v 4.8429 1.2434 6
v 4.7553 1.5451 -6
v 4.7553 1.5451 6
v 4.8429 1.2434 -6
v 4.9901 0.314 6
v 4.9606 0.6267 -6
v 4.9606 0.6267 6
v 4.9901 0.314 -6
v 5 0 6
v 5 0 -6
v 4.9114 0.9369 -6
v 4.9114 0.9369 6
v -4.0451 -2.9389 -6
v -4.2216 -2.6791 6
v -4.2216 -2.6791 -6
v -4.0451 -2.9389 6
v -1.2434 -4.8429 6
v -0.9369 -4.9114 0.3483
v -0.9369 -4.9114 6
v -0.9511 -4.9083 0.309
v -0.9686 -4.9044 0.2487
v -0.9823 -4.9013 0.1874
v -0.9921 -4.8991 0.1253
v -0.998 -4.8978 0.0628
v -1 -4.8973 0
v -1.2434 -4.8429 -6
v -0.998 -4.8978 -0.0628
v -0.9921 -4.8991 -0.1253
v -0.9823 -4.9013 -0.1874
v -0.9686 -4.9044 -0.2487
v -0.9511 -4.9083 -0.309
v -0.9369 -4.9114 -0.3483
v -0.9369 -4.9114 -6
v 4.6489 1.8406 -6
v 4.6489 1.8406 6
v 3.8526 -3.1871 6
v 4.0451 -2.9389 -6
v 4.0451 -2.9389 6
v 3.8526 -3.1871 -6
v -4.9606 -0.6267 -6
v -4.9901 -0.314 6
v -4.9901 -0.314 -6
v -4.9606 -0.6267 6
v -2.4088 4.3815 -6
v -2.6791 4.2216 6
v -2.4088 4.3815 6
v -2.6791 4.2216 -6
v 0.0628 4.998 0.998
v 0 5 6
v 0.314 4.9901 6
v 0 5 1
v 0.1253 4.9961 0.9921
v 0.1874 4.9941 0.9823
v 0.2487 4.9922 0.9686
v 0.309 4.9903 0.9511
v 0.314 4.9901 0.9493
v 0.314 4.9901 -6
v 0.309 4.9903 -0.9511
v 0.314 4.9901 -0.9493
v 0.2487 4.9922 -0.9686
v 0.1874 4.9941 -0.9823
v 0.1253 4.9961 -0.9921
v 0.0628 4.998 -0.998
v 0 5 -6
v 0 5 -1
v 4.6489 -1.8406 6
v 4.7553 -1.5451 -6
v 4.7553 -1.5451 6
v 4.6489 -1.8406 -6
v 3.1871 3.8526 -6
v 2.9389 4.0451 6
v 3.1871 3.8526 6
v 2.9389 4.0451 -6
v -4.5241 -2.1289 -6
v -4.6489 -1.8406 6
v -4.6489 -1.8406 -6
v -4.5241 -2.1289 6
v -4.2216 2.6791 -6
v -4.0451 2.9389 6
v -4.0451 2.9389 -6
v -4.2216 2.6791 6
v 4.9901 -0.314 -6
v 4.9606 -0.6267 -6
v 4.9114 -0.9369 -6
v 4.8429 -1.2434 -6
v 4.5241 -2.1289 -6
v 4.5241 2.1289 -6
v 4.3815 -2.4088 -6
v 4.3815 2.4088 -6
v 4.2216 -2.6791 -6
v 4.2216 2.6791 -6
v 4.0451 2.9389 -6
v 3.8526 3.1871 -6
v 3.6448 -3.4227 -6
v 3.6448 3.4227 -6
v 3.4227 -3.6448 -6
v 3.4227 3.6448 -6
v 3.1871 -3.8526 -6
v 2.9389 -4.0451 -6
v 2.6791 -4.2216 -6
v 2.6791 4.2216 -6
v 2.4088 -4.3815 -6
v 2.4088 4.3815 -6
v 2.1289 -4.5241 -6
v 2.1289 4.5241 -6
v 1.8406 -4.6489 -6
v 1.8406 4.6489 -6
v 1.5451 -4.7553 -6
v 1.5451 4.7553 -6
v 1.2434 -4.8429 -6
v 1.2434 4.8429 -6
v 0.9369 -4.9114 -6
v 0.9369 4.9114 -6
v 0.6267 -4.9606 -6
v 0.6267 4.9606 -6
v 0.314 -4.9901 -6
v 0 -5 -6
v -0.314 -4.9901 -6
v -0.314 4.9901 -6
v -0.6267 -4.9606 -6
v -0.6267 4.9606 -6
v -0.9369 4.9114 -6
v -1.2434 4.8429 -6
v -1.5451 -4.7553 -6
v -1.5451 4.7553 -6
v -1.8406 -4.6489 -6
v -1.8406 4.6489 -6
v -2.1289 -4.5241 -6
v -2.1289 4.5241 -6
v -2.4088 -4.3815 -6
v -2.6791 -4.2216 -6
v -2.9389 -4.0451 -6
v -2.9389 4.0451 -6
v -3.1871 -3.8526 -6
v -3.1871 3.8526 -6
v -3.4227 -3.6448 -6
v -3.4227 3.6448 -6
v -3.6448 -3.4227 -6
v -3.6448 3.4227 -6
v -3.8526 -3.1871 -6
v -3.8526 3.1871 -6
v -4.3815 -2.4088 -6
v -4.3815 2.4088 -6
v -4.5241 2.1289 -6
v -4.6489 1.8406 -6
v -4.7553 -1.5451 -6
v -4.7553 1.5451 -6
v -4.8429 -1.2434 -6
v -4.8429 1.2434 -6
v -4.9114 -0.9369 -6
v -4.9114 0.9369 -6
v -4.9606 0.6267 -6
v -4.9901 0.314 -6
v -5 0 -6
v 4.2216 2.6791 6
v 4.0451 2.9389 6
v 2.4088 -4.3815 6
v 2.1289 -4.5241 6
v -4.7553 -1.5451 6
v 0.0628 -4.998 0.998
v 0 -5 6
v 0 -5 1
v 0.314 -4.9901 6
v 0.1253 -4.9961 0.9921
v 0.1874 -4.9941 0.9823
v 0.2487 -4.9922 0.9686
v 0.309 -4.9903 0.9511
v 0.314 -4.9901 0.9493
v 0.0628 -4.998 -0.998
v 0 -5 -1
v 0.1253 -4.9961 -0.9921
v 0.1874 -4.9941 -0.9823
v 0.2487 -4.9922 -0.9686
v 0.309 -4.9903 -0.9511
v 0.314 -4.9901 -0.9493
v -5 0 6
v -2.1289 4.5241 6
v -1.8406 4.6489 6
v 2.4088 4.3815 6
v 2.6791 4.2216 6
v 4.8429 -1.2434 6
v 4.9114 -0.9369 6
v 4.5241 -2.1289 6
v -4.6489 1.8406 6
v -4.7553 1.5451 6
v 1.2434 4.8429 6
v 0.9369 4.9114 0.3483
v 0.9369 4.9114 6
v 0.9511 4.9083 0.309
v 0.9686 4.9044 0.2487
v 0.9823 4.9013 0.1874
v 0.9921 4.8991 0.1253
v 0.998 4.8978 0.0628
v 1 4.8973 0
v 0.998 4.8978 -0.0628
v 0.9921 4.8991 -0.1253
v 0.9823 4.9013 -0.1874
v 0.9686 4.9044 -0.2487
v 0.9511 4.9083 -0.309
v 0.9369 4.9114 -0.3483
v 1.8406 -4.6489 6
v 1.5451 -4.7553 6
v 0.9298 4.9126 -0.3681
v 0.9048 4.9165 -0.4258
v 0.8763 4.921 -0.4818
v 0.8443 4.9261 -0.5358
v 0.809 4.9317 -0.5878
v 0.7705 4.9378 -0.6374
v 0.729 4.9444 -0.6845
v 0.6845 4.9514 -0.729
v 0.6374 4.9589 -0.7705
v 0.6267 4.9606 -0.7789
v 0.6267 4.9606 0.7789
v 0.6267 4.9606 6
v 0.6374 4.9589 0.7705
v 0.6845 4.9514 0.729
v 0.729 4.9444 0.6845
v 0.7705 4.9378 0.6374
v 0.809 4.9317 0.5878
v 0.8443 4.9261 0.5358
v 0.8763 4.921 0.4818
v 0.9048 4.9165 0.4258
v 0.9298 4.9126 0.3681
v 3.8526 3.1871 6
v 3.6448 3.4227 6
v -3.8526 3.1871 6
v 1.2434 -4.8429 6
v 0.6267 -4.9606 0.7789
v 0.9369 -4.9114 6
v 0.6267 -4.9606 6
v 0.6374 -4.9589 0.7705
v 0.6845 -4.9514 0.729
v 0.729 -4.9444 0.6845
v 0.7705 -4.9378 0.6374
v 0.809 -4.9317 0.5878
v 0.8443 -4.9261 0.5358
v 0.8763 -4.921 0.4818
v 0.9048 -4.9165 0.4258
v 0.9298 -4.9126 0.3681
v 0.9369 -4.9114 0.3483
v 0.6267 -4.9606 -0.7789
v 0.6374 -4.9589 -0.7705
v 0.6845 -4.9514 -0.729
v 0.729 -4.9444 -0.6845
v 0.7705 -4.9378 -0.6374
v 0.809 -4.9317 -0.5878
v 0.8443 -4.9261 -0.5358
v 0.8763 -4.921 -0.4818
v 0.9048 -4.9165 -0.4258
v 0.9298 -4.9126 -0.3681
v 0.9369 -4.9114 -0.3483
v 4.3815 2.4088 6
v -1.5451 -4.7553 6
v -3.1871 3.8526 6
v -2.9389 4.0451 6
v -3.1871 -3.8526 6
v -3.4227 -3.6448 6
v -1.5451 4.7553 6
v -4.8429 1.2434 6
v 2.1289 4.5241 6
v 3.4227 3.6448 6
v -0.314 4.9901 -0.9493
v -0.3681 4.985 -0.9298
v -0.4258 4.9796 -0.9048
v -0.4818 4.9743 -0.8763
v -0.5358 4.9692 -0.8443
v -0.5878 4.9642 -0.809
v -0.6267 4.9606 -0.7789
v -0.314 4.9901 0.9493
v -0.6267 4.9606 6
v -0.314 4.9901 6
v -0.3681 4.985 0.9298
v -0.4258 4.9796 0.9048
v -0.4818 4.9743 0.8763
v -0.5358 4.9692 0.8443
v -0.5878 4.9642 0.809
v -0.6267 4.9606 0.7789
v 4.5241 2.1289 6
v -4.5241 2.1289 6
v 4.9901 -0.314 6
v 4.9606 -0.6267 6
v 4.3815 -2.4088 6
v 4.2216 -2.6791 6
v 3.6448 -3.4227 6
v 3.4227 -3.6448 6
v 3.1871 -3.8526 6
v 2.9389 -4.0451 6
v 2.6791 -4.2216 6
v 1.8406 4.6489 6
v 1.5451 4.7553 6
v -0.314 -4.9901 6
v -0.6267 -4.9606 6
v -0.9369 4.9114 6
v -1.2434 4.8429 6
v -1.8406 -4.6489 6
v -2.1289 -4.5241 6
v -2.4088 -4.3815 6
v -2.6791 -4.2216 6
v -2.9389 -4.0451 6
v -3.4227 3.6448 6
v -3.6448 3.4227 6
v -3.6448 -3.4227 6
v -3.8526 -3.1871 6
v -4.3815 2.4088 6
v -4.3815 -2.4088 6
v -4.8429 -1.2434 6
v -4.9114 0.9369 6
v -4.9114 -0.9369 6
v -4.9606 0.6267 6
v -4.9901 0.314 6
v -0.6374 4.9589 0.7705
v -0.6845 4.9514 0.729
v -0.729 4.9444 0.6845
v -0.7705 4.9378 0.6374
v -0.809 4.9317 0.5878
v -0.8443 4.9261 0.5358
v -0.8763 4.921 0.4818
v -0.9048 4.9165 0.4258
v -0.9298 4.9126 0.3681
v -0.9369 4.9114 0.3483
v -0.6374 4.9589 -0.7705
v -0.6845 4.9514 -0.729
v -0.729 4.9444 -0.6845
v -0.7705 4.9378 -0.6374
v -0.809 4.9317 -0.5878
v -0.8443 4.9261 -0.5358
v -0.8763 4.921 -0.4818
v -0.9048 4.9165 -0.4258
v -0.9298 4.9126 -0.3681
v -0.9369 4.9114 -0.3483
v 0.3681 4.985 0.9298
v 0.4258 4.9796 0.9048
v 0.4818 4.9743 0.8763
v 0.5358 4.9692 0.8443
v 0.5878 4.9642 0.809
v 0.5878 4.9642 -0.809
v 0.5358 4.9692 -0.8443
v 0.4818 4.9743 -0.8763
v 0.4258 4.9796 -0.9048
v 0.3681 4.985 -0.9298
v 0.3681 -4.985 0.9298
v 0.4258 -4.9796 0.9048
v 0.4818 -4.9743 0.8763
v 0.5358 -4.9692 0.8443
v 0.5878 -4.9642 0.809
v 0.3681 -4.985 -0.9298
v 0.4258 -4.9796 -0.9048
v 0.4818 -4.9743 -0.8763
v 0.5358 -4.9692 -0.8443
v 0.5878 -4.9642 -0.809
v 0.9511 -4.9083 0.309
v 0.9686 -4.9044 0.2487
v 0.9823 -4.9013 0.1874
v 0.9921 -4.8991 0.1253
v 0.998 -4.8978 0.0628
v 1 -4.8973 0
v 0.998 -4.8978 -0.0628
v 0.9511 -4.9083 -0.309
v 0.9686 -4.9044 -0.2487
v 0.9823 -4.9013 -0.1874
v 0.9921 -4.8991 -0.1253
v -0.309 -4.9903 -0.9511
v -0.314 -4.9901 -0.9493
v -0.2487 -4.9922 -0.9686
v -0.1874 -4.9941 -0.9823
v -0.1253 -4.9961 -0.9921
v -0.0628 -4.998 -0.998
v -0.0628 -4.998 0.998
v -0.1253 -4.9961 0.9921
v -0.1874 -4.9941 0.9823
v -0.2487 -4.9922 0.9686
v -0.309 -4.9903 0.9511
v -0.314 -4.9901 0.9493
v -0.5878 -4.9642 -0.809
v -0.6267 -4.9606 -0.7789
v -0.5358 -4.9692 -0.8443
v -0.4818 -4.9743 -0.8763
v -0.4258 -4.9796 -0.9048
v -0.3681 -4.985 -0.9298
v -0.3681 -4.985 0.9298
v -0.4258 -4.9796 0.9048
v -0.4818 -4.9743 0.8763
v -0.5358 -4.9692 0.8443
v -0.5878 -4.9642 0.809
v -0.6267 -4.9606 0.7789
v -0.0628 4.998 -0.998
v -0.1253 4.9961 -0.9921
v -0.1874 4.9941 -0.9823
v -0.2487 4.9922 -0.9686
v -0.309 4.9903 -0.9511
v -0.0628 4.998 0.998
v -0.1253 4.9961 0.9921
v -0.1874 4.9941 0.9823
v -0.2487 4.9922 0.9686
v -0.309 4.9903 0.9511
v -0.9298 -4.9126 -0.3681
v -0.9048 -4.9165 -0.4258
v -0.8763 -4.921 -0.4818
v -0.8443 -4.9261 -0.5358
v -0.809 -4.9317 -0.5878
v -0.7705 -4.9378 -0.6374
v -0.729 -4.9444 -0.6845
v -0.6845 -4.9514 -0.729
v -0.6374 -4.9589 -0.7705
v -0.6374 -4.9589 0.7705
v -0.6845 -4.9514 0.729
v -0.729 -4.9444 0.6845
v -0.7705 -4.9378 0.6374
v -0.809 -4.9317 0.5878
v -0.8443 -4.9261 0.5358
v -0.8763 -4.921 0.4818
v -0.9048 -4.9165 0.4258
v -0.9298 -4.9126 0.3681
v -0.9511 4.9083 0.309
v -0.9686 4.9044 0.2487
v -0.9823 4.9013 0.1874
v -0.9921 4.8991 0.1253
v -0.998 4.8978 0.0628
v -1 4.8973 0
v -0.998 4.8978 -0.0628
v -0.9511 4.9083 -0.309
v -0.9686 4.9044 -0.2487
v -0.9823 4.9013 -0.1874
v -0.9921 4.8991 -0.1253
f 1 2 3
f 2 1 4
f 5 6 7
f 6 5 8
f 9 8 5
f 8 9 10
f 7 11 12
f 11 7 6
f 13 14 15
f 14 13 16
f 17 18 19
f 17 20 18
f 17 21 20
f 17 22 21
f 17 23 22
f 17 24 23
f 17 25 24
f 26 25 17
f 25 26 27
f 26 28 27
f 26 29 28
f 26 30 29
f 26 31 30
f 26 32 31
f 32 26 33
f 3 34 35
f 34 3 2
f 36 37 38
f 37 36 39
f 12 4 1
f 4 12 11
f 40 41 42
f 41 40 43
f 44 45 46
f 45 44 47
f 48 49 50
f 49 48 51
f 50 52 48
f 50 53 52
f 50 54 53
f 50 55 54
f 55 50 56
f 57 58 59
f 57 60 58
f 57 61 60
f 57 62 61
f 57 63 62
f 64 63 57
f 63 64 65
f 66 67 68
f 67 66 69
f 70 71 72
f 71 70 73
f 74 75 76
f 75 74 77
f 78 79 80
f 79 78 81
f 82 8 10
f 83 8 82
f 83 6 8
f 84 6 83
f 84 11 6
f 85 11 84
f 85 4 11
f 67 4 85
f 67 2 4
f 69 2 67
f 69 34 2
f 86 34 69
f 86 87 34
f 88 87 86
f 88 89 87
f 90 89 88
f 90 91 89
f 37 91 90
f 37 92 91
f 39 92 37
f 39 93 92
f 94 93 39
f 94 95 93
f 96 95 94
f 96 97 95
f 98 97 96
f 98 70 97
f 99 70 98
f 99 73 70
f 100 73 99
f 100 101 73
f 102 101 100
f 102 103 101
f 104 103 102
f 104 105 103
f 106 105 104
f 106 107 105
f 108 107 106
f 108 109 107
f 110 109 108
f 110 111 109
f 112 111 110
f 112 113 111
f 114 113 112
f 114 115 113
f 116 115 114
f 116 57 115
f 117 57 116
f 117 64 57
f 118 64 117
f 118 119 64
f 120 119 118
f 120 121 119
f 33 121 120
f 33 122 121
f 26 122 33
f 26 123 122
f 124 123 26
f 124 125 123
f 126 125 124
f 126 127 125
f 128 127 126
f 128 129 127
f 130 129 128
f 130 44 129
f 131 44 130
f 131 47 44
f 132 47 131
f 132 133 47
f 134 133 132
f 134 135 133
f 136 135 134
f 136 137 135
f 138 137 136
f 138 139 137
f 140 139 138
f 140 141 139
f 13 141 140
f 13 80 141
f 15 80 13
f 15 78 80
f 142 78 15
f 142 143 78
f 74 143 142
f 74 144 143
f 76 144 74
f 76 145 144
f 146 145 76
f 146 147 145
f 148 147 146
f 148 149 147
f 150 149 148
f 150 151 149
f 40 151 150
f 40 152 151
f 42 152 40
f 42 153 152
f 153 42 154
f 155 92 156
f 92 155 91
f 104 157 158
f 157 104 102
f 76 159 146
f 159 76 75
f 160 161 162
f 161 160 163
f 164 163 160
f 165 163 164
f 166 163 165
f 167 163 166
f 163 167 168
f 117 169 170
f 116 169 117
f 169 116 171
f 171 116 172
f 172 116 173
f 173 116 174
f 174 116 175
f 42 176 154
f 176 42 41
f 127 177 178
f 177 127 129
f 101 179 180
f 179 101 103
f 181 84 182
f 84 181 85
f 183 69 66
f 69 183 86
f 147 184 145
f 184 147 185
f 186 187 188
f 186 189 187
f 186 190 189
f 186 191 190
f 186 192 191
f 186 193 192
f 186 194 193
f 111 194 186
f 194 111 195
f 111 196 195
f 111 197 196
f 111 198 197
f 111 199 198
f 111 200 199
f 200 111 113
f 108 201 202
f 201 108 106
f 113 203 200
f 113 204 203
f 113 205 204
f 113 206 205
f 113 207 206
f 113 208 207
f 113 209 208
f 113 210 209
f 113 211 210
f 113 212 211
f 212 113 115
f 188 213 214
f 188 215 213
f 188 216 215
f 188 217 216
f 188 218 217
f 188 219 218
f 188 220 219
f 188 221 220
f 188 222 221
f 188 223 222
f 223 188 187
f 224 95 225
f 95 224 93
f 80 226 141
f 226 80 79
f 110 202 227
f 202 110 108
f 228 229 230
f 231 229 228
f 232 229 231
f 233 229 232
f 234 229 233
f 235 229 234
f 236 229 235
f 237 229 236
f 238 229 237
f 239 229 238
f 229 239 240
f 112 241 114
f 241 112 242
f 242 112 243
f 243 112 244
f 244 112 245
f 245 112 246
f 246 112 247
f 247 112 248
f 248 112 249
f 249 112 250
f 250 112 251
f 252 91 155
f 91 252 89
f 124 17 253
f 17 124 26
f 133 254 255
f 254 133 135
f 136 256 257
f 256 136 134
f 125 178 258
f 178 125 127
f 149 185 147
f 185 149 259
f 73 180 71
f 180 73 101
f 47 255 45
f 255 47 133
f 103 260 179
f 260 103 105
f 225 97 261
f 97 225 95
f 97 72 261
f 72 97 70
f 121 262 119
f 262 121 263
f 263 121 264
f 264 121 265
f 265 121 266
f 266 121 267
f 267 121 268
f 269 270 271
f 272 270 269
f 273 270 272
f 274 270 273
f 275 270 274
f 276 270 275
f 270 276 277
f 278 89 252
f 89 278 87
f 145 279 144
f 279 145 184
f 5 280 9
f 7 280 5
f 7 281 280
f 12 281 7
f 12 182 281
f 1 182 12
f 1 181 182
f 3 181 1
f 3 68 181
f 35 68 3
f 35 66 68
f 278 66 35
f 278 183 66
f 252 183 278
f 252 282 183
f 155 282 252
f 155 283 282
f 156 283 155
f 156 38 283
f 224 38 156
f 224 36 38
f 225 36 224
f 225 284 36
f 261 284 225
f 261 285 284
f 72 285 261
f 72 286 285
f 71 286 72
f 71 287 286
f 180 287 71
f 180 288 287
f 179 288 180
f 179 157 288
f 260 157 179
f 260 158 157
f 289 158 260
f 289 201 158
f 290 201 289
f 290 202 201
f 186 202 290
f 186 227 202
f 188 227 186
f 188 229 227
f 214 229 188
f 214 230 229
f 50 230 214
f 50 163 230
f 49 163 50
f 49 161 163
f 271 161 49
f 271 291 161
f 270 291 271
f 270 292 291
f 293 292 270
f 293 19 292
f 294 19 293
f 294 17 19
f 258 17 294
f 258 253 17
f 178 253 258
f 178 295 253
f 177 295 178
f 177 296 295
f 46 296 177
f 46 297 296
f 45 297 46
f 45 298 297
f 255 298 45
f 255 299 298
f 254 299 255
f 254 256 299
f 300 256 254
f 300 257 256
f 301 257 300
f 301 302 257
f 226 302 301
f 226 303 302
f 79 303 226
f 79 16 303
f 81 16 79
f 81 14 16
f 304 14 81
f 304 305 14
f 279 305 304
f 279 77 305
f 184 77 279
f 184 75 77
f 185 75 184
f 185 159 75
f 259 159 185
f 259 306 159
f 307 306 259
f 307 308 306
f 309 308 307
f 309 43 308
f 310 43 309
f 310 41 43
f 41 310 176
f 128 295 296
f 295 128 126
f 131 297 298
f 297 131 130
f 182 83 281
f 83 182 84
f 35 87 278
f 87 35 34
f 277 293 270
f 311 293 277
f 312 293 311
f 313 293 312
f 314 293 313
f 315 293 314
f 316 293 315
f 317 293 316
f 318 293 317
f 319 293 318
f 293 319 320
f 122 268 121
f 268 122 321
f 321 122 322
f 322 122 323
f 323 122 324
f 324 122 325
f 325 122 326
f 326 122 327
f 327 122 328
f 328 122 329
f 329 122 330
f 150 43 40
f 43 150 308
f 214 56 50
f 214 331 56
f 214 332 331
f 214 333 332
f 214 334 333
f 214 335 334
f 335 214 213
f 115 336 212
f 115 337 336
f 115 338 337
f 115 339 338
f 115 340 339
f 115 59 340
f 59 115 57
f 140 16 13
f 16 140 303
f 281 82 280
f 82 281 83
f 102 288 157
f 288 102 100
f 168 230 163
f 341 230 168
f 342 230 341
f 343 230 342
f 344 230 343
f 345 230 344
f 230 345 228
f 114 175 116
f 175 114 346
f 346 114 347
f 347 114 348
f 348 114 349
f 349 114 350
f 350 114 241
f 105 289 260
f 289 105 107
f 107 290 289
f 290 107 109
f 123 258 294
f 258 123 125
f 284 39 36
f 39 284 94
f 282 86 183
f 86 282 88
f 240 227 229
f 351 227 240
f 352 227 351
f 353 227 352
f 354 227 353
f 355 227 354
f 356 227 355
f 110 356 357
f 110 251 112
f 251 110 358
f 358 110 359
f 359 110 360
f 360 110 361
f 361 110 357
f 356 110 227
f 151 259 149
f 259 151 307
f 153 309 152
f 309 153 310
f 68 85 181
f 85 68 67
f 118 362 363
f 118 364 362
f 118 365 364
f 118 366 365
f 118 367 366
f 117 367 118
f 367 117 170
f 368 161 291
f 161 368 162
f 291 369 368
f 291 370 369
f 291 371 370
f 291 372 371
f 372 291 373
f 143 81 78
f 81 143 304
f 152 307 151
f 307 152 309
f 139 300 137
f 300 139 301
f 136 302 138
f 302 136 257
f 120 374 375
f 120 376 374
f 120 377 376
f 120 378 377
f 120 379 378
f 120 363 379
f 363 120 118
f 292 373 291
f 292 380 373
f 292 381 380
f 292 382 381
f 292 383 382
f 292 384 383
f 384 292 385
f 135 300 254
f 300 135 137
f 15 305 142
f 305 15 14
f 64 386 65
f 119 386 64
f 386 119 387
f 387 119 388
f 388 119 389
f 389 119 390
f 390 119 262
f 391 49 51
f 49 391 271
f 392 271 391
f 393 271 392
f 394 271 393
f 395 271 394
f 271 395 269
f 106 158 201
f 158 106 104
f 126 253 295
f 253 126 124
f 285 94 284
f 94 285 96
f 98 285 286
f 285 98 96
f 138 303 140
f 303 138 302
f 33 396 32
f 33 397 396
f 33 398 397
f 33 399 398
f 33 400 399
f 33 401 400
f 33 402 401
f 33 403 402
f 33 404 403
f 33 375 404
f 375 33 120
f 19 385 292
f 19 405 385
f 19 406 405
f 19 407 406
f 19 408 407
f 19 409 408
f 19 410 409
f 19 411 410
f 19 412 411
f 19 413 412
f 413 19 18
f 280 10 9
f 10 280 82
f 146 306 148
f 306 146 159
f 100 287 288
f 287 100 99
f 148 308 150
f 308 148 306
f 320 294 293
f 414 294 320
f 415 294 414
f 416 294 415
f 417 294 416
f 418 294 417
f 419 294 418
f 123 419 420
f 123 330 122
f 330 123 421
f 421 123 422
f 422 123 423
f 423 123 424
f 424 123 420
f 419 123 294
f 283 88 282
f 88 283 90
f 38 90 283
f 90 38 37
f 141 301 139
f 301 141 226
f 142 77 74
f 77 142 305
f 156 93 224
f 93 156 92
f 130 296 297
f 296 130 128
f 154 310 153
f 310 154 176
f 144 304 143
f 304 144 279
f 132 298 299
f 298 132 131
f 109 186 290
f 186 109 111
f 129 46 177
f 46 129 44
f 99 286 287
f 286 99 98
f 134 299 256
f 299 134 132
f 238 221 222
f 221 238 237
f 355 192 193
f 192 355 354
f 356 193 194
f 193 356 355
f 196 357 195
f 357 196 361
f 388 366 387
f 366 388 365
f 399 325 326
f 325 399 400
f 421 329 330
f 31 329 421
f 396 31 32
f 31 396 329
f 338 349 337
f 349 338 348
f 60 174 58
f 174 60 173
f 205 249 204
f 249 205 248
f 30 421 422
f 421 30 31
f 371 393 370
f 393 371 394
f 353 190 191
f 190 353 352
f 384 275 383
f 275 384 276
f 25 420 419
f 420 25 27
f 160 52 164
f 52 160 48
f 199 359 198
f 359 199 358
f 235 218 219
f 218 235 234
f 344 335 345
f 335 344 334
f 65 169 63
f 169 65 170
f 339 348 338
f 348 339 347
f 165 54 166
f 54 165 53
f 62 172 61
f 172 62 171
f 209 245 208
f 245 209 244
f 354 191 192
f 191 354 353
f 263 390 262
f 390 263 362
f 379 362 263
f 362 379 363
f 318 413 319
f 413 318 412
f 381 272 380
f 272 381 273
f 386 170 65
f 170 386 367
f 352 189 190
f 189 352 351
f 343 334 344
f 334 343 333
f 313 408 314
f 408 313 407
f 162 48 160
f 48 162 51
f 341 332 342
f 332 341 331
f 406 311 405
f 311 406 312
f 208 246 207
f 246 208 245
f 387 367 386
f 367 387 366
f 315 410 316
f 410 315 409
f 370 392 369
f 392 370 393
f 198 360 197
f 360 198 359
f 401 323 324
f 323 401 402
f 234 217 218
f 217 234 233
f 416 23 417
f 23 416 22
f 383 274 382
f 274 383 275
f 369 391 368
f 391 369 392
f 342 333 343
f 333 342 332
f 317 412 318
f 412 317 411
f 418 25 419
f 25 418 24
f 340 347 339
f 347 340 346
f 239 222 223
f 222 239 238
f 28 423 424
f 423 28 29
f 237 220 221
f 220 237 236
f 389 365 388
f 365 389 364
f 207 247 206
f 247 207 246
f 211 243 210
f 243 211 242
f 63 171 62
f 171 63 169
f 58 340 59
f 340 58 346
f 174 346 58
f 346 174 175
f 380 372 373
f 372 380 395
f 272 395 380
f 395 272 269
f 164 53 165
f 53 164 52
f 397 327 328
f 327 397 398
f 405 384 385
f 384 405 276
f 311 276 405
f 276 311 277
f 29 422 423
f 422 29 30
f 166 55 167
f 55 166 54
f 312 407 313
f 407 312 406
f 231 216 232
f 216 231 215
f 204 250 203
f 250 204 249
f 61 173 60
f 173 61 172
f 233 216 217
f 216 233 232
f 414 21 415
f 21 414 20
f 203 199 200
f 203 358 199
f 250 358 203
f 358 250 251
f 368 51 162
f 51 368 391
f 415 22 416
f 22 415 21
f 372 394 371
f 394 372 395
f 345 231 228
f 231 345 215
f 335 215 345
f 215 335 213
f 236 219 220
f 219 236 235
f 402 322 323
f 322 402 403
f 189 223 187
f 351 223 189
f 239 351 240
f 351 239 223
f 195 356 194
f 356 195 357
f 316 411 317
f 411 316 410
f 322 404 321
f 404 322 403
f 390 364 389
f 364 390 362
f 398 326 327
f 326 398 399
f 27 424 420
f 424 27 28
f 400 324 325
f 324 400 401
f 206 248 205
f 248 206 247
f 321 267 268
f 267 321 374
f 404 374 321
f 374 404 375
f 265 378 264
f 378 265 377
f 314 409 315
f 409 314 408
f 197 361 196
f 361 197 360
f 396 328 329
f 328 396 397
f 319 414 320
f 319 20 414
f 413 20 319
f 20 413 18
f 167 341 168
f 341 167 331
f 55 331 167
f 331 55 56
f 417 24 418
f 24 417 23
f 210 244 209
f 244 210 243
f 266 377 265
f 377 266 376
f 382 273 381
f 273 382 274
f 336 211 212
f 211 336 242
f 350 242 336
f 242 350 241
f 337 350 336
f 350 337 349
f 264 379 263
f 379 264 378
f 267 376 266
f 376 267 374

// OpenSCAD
// See http://en.wikibooks.org/wiki/OpenSCAD_User_Manual/The_OpenSCAD_Language#Modifier_Characters
// Ignore this subtree for the normal rendering process and draw it in transparent gray (all transformations are still applied to the nodes in this tree).
// Because the marked subtree is completely ignored, it might have unexpected effects in case it's used for example with the first object in a difference(). In that case this object will be rendered in transparent gray, but it will not be the base for the difference()!
// Usage:
//   % { ... }

difference() {
	cylinder (h = 12, r=5, center = true, $fn=100);
	// first object that will subtracted
	rotate ([90,0,0]) cylinder (h = 15, r=1, center = true, $fn=100);
	// second object that will be subtracted
	%rotate ([0,90,0]) cylinder (h = 15, r=3, center = true, $fn=100);
}
